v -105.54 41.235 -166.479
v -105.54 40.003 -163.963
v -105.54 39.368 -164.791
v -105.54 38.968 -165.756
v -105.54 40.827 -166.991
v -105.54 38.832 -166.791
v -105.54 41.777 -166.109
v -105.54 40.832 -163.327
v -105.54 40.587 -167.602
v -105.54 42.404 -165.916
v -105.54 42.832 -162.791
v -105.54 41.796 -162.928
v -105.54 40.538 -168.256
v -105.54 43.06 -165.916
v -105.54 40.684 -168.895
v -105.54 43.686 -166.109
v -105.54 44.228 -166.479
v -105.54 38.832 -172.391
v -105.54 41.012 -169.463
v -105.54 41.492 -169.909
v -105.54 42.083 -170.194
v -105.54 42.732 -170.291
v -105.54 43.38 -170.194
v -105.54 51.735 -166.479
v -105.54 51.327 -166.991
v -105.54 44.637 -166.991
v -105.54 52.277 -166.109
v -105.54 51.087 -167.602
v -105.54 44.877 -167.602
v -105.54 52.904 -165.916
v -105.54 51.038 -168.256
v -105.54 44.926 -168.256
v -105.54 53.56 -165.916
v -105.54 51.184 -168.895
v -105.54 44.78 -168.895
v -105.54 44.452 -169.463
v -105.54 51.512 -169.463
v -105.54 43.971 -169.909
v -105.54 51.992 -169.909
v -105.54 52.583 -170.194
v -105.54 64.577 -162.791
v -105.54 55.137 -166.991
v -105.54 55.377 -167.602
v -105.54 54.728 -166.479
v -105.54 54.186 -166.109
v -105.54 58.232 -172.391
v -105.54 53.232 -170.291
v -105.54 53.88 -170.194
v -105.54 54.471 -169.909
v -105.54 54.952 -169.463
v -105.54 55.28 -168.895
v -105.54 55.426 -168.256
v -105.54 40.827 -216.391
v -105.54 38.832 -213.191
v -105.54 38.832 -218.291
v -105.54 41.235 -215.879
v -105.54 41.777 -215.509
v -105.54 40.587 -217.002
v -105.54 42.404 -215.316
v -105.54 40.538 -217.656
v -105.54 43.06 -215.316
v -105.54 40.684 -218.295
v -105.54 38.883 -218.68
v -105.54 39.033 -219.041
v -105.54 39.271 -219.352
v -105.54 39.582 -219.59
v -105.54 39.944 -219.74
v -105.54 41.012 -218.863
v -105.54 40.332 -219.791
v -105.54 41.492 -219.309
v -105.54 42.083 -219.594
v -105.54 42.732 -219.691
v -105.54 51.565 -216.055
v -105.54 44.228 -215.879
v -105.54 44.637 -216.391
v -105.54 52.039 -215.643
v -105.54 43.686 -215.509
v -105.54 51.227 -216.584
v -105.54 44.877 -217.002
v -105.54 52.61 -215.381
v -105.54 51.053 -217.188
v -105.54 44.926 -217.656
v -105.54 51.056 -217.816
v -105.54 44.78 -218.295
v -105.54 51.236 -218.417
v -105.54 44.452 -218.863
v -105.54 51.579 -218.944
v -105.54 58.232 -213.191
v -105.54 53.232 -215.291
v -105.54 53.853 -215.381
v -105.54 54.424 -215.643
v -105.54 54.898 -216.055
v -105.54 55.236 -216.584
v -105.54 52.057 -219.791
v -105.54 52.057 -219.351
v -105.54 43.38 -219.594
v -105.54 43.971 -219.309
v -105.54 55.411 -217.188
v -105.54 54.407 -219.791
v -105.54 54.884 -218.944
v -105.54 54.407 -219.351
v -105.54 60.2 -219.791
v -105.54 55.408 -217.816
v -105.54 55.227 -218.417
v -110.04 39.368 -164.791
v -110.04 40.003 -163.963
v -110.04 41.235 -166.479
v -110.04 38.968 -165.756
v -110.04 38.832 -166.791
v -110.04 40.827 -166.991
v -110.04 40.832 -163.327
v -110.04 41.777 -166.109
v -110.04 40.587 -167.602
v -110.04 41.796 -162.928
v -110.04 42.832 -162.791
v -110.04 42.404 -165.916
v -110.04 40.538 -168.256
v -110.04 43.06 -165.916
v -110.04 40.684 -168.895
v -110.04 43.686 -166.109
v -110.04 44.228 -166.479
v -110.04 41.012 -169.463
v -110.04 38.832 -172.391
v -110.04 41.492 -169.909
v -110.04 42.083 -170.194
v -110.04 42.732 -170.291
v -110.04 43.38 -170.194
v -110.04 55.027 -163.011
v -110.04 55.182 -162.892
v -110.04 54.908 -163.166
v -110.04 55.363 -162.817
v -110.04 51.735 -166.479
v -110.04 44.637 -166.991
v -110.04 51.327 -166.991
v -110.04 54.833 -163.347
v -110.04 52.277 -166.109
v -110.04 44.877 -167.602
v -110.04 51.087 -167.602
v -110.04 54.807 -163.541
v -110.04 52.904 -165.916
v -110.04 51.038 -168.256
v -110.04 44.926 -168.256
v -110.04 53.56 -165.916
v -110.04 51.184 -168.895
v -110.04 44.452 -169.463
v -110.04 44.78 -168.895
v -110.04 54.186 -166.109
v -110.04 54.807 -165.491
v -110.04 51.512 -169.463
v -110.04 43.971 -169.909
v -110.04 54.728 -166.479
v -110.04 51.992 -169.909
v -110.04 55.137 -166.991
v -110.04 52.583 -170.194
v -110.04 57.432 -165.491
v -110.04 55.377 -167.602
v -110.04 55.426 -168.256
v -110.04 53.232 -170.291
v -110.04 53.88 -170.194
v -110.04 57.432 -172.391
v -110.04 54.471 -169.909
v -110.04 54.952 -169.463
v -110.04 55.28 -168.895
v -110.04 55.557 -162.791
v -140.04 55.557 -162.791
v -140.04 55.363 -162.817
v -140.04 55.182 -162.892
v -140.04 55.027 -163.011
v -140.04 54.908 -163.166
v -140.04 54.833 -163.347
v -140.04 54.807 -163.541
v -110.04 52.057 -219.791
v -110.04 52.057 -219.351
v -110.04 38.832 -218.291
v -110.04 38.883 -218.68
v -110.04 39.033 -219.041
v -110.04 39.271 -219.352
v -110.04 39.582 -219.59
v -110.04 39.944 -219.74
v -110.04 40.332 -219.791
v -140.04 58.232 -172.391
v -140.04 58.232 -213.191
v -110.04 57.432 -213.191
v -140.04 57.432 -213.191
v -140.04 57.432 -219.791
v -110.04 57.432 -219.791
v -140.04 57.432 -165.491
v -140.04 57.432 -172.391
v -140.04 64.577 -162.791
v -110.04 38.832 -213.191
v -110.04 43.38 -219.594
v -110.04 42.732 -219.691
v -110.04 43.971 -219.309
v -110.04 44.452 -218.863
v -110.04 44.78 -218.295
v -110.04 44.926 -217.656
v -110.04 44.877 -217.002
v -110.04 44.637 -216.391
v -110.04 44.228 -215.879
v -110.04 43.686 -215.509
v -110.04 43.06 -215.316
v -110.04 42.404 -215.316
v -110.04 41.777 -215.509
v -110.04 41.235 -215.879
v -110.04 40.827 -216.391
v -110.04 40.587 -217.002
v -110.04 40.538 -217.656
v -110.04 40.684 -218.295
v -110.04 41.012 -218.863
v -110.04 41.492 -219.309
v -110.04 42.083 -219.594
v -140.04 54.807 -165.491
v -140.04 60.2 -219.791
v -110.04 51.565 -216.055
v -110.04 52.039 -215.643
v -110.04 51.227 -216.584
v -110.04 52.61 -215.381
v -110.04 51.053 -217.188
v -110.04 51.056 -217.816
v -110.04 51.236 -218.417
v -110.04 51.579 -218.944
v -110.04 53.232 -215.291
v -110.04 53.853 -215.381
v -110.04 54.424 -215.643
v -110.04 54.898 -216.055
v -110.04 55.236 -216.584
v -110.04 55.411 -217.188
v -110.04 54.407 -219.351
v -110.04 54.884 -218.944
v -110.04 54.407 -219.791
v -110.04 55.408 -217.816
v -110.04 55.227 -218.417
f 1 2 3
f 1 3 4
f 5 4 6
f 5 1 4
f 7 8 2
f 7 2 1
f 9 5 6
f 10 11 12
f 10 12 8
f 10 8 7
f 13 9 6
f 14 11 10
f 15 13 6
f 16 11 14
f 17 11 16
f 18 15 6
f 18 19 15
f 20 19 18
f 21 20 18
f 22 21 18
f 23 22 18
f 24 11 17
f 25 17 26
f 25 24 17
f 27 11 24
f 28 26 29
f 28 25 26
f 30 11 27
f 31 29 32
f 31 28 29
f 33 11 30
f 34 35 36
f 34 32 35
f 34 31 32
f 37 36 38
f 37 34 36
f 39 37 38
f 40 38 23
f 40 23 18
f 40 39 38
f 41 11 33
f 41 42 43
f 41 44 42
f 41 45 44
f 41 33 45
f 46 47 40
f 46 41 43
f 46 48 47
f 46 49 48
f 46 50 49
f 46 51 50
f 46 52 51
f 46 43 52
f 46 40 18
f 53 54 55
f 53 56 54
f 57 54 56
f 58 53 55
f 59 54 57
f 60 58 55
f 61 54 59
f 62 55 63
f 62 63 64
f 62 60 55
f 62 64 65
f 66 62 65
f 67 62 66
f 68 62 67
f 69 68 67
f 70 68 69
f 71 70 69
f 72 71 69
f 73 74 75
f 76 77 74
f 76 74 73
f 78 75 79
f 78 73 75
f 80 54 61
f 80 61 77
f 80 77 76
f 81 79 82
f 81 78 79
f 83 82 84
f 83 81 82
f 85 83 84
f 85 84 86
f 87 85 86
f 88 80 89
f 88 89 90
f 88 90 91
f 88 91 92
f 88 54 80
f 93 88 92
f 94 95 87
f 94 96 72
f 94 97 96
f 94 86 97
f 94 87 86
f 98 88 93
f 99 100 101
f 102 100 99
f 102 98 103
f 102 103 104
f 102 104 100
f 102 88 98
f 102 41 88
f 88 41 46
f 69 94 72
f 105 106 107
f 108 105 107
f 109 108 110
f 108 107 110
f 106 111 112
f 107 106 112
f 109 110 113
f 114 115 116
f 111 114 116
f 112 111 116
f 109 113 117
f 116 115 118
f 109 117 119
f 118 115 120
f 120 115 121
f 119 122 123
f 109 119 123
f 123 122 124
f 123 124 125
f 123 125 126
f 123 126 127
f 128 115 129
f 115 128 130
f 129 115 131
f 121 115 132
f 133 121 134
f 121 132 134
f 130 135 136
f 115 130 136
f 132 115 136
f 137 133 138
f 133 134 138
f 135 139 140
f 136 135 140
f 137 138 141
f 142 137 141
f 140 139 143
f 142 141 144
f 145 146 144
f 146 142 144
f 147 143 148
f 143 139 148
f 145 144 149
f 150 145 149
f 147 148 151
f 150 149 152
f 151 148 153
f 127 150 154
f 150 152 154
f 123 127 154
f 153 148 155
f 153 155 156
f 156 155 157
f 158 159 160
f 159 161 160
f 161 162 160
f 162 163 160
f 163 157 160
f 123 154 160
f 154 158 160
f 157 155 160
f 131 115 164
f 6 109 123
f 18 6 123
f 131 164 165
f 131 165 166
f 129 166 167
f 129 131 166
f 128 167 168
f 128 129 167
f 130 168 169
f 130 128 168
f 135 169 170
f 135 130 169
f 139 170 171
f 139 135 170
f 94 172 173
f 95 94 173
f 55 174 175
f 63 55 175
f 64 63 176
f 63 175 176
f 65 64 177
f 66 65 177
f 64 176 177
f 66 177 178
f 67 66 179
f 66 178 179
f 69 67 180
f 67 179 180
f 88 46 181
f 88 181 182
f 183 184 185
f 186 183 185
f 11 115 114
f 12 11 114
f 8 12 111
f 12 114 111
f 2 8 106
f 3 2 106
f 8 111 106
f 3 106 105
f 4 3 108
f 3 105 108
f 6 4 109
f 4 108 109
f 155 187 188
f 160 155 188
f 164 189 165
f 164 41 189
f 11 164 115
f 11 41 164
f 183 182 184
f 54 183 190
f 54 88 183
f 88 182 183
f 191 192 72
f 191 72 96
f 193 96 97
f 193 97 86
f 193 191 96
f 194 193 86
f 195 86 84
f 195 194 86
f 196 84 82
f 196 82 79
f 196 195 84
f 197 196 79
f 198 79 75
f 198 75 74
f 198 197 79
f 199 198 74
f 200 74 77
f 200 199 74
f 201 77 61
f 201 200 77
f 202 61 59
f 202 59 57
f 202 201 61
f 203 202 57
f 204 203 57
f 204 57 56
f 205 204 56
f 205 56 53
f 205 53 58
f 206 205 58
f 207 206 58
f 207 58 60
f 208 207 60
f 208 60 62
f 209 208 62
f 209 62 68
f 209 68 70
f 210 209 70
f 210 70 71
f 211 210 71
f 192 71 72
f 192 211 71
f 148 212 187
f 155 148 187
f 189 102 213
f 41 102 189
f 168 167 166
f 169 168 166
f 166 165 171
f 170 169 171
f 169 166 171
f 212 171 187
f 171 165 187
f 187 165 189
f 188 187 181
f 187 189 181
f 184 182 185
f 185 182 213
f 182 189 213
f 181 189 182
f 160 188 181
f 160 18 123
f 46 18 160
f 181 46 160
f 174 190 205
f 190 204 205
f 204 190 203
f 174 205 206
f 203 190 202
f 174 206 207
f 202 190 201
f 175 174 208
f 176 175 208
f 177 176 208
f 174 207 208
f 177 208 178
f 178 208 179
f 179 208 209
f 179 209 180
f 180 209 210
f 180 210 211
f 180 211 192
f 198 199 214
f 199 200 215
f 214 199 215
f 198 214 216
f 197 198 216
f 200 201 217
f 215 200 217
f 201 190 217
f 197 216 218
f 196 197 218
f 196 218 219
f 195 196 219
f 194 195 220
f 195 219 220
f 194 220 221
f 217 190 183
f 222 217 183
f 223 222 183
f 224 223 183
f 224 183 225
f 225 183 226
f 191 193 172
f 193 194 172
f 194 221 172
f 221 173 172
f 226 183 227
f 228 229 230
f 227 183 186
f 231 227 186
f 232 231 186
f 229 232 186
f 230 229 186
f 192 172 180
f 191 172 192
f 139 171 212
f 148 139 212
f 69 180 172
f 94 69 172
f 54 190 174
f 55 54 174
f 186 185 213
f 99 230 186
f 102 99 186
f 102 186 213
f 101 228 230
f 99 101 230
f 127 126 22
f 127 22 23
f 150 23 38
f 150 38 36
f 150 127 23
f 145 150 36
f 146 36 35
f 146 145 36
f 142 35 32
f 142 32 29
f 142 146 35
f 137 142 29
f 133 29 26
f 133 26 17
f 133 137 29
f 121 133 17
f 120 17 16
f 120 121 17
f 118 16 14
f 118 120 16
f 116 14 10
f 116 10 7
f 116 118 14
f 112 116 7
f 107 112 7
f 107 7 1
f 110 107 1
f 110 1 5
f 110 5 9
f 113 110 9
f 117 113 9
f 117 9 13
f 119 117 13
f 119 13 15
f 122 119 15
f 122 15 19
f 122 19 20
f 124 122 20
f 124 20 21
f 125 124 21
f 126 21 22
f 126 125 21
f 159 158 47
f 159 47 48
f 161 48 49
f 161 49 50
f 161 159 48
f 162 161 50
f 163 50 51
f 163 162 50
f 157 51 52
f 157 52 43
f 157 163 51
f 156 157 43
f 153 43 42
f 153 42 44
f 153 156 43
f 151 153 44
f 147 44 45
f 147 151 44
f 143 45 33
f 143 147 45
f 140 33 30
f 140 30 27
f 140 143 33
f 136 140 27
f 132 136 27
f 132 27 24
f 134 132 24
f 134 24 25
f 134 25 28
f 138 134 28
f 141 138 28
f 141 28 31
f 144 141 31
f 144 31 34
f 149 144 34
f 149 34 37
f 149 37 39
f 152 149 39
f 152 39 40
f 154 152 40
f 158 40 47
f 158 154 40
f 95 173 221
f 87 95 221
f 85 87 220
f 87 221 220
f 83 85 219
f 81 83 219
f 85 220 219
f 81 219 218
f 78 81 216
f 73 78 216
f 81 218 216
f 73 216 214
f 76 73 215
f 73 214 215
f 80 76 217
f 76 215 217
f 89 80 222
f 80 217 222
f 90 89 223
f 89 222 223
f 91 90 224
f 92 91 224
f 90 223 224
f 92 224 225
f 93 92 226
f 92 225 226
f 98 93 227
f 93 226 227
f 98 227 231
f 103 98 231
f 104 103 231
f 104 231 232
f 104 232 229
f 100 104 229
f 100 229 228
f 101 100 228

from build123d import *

# Parameters (mm, degrees)
SKETCH1_R           = 2.2
BOSS_EXTRUDE1_DEPTH = 4.5
BOSS_EXTRUDE2_DEPTH = 30


with BuildPart() as part:
    # Sketch1 → Boss-Extrude1 (new body)
    with BuildSketch(Plane(origin=(-110.040337845, 0, 0), x_dir=(0, 0, -1), z_dir=(1, 0, 0))):
        with BuildLine():
            Line((172.391431391, 38.831766631), (172.391431391, 58.231766631))
            Line((172.391431391, 58.231766631), (213.191431391, 58.231766631))
            Line((213.191431391, 58.231766631), (213.191431391, 38.831766631))
            Line((213.191431391, 38.831766631), (218.291431391, 38.831766631))
            ThreePointArc((218.291431391, 38.831766631), (219.352091563, 39.27110646), (219.791431391, 40.331766631))
            Line((219.791431391, 40.331766631), (219.791431391, 52.056766631))
            Line((219.791431391, 52.056766631), (219.351370906, 52.056766631))
            ThreePointArc((219.351370906, 52.056766631), (215.291431391, 53.231766631), (219.351370906, 54.406766631))
            Line((219.351370906, 54.406766631), (219.791431391, 54.406766631))
            Line((219.791431391, 54.406766631), (219.791431391, 60.200456158))
            Line((219.791431391, 60.200456158), (162.791431391, 64.577419509))
            Line((162.791431391, 64.577419509), (162.791431391, 42.831766631))
            ThreePointArc((162.791431391, 42.831766631), (163.963004266, 40.003339507), (166.791431391, 38.831766631))
            Line((166.791431391, 38.831766631), (172.391431391, 38.831766631))
        make_face()
        with Locations((168.091431391, 42.731766631)):
            Circle(SKETCH1_R, mode=Mode.SUBTRACT)
        with Locations((168.091431391, 53.231766631)):
            Circle(SKETCH1_R, mode=Mode.SUBTRACT)
        with Locations((217.491431391, 42.731766631)):
            Circle(SKETCH1_R, mode=Mode.SUBTRACT)
    extrude(amount=BOSS_EXTRUDE1_DEPTH)

    # Sketch1<3> → Boss-Extrude2 (add)
    with BuildSketch(Plane(origin=(-110.040337845, 0, 0), x_dir=(0, 0, -1), z_dir=(1, 0, 0))):
        with BuildLine():
            Line((162.791431391, 64.577419509), (162.791431391, 55.557459873))
            ThreePointArc((162.791431391, 55.557459873), (163.011101309, 55.027129783), (163.541431403, 54.807459873))
            Line((163.541431403, 54.807459873), (165.491431391, 54.807459873))
            Line((165.491431391, 54.807459873), (165.491431391, 57.431766631))
            Line((165.491431391, 57.431766631), (172.391431391, 57.431766631))
            Line((172.391431391, 57.431766631), (172.391431391, 58.231766631))
            Line((172.391431391, 58.231766631), (213.191431391, 58.231766631))
            Line((213.191431391, 58.231766631), (213.191431391, 57.431766631))
            Line((213.191431391, 57.431766631), (219.791431391, 57.431766631))
            Line((219.791431391, 57.431766631), (219.791431391, 60.200456158))
            Line((219.791431391, 60.200456158), (162.791431391, 64.577419509))
        make_face()
    extrude(amount=-BOSS_EXTRUDE2_DEPTH)


solid = part.part
